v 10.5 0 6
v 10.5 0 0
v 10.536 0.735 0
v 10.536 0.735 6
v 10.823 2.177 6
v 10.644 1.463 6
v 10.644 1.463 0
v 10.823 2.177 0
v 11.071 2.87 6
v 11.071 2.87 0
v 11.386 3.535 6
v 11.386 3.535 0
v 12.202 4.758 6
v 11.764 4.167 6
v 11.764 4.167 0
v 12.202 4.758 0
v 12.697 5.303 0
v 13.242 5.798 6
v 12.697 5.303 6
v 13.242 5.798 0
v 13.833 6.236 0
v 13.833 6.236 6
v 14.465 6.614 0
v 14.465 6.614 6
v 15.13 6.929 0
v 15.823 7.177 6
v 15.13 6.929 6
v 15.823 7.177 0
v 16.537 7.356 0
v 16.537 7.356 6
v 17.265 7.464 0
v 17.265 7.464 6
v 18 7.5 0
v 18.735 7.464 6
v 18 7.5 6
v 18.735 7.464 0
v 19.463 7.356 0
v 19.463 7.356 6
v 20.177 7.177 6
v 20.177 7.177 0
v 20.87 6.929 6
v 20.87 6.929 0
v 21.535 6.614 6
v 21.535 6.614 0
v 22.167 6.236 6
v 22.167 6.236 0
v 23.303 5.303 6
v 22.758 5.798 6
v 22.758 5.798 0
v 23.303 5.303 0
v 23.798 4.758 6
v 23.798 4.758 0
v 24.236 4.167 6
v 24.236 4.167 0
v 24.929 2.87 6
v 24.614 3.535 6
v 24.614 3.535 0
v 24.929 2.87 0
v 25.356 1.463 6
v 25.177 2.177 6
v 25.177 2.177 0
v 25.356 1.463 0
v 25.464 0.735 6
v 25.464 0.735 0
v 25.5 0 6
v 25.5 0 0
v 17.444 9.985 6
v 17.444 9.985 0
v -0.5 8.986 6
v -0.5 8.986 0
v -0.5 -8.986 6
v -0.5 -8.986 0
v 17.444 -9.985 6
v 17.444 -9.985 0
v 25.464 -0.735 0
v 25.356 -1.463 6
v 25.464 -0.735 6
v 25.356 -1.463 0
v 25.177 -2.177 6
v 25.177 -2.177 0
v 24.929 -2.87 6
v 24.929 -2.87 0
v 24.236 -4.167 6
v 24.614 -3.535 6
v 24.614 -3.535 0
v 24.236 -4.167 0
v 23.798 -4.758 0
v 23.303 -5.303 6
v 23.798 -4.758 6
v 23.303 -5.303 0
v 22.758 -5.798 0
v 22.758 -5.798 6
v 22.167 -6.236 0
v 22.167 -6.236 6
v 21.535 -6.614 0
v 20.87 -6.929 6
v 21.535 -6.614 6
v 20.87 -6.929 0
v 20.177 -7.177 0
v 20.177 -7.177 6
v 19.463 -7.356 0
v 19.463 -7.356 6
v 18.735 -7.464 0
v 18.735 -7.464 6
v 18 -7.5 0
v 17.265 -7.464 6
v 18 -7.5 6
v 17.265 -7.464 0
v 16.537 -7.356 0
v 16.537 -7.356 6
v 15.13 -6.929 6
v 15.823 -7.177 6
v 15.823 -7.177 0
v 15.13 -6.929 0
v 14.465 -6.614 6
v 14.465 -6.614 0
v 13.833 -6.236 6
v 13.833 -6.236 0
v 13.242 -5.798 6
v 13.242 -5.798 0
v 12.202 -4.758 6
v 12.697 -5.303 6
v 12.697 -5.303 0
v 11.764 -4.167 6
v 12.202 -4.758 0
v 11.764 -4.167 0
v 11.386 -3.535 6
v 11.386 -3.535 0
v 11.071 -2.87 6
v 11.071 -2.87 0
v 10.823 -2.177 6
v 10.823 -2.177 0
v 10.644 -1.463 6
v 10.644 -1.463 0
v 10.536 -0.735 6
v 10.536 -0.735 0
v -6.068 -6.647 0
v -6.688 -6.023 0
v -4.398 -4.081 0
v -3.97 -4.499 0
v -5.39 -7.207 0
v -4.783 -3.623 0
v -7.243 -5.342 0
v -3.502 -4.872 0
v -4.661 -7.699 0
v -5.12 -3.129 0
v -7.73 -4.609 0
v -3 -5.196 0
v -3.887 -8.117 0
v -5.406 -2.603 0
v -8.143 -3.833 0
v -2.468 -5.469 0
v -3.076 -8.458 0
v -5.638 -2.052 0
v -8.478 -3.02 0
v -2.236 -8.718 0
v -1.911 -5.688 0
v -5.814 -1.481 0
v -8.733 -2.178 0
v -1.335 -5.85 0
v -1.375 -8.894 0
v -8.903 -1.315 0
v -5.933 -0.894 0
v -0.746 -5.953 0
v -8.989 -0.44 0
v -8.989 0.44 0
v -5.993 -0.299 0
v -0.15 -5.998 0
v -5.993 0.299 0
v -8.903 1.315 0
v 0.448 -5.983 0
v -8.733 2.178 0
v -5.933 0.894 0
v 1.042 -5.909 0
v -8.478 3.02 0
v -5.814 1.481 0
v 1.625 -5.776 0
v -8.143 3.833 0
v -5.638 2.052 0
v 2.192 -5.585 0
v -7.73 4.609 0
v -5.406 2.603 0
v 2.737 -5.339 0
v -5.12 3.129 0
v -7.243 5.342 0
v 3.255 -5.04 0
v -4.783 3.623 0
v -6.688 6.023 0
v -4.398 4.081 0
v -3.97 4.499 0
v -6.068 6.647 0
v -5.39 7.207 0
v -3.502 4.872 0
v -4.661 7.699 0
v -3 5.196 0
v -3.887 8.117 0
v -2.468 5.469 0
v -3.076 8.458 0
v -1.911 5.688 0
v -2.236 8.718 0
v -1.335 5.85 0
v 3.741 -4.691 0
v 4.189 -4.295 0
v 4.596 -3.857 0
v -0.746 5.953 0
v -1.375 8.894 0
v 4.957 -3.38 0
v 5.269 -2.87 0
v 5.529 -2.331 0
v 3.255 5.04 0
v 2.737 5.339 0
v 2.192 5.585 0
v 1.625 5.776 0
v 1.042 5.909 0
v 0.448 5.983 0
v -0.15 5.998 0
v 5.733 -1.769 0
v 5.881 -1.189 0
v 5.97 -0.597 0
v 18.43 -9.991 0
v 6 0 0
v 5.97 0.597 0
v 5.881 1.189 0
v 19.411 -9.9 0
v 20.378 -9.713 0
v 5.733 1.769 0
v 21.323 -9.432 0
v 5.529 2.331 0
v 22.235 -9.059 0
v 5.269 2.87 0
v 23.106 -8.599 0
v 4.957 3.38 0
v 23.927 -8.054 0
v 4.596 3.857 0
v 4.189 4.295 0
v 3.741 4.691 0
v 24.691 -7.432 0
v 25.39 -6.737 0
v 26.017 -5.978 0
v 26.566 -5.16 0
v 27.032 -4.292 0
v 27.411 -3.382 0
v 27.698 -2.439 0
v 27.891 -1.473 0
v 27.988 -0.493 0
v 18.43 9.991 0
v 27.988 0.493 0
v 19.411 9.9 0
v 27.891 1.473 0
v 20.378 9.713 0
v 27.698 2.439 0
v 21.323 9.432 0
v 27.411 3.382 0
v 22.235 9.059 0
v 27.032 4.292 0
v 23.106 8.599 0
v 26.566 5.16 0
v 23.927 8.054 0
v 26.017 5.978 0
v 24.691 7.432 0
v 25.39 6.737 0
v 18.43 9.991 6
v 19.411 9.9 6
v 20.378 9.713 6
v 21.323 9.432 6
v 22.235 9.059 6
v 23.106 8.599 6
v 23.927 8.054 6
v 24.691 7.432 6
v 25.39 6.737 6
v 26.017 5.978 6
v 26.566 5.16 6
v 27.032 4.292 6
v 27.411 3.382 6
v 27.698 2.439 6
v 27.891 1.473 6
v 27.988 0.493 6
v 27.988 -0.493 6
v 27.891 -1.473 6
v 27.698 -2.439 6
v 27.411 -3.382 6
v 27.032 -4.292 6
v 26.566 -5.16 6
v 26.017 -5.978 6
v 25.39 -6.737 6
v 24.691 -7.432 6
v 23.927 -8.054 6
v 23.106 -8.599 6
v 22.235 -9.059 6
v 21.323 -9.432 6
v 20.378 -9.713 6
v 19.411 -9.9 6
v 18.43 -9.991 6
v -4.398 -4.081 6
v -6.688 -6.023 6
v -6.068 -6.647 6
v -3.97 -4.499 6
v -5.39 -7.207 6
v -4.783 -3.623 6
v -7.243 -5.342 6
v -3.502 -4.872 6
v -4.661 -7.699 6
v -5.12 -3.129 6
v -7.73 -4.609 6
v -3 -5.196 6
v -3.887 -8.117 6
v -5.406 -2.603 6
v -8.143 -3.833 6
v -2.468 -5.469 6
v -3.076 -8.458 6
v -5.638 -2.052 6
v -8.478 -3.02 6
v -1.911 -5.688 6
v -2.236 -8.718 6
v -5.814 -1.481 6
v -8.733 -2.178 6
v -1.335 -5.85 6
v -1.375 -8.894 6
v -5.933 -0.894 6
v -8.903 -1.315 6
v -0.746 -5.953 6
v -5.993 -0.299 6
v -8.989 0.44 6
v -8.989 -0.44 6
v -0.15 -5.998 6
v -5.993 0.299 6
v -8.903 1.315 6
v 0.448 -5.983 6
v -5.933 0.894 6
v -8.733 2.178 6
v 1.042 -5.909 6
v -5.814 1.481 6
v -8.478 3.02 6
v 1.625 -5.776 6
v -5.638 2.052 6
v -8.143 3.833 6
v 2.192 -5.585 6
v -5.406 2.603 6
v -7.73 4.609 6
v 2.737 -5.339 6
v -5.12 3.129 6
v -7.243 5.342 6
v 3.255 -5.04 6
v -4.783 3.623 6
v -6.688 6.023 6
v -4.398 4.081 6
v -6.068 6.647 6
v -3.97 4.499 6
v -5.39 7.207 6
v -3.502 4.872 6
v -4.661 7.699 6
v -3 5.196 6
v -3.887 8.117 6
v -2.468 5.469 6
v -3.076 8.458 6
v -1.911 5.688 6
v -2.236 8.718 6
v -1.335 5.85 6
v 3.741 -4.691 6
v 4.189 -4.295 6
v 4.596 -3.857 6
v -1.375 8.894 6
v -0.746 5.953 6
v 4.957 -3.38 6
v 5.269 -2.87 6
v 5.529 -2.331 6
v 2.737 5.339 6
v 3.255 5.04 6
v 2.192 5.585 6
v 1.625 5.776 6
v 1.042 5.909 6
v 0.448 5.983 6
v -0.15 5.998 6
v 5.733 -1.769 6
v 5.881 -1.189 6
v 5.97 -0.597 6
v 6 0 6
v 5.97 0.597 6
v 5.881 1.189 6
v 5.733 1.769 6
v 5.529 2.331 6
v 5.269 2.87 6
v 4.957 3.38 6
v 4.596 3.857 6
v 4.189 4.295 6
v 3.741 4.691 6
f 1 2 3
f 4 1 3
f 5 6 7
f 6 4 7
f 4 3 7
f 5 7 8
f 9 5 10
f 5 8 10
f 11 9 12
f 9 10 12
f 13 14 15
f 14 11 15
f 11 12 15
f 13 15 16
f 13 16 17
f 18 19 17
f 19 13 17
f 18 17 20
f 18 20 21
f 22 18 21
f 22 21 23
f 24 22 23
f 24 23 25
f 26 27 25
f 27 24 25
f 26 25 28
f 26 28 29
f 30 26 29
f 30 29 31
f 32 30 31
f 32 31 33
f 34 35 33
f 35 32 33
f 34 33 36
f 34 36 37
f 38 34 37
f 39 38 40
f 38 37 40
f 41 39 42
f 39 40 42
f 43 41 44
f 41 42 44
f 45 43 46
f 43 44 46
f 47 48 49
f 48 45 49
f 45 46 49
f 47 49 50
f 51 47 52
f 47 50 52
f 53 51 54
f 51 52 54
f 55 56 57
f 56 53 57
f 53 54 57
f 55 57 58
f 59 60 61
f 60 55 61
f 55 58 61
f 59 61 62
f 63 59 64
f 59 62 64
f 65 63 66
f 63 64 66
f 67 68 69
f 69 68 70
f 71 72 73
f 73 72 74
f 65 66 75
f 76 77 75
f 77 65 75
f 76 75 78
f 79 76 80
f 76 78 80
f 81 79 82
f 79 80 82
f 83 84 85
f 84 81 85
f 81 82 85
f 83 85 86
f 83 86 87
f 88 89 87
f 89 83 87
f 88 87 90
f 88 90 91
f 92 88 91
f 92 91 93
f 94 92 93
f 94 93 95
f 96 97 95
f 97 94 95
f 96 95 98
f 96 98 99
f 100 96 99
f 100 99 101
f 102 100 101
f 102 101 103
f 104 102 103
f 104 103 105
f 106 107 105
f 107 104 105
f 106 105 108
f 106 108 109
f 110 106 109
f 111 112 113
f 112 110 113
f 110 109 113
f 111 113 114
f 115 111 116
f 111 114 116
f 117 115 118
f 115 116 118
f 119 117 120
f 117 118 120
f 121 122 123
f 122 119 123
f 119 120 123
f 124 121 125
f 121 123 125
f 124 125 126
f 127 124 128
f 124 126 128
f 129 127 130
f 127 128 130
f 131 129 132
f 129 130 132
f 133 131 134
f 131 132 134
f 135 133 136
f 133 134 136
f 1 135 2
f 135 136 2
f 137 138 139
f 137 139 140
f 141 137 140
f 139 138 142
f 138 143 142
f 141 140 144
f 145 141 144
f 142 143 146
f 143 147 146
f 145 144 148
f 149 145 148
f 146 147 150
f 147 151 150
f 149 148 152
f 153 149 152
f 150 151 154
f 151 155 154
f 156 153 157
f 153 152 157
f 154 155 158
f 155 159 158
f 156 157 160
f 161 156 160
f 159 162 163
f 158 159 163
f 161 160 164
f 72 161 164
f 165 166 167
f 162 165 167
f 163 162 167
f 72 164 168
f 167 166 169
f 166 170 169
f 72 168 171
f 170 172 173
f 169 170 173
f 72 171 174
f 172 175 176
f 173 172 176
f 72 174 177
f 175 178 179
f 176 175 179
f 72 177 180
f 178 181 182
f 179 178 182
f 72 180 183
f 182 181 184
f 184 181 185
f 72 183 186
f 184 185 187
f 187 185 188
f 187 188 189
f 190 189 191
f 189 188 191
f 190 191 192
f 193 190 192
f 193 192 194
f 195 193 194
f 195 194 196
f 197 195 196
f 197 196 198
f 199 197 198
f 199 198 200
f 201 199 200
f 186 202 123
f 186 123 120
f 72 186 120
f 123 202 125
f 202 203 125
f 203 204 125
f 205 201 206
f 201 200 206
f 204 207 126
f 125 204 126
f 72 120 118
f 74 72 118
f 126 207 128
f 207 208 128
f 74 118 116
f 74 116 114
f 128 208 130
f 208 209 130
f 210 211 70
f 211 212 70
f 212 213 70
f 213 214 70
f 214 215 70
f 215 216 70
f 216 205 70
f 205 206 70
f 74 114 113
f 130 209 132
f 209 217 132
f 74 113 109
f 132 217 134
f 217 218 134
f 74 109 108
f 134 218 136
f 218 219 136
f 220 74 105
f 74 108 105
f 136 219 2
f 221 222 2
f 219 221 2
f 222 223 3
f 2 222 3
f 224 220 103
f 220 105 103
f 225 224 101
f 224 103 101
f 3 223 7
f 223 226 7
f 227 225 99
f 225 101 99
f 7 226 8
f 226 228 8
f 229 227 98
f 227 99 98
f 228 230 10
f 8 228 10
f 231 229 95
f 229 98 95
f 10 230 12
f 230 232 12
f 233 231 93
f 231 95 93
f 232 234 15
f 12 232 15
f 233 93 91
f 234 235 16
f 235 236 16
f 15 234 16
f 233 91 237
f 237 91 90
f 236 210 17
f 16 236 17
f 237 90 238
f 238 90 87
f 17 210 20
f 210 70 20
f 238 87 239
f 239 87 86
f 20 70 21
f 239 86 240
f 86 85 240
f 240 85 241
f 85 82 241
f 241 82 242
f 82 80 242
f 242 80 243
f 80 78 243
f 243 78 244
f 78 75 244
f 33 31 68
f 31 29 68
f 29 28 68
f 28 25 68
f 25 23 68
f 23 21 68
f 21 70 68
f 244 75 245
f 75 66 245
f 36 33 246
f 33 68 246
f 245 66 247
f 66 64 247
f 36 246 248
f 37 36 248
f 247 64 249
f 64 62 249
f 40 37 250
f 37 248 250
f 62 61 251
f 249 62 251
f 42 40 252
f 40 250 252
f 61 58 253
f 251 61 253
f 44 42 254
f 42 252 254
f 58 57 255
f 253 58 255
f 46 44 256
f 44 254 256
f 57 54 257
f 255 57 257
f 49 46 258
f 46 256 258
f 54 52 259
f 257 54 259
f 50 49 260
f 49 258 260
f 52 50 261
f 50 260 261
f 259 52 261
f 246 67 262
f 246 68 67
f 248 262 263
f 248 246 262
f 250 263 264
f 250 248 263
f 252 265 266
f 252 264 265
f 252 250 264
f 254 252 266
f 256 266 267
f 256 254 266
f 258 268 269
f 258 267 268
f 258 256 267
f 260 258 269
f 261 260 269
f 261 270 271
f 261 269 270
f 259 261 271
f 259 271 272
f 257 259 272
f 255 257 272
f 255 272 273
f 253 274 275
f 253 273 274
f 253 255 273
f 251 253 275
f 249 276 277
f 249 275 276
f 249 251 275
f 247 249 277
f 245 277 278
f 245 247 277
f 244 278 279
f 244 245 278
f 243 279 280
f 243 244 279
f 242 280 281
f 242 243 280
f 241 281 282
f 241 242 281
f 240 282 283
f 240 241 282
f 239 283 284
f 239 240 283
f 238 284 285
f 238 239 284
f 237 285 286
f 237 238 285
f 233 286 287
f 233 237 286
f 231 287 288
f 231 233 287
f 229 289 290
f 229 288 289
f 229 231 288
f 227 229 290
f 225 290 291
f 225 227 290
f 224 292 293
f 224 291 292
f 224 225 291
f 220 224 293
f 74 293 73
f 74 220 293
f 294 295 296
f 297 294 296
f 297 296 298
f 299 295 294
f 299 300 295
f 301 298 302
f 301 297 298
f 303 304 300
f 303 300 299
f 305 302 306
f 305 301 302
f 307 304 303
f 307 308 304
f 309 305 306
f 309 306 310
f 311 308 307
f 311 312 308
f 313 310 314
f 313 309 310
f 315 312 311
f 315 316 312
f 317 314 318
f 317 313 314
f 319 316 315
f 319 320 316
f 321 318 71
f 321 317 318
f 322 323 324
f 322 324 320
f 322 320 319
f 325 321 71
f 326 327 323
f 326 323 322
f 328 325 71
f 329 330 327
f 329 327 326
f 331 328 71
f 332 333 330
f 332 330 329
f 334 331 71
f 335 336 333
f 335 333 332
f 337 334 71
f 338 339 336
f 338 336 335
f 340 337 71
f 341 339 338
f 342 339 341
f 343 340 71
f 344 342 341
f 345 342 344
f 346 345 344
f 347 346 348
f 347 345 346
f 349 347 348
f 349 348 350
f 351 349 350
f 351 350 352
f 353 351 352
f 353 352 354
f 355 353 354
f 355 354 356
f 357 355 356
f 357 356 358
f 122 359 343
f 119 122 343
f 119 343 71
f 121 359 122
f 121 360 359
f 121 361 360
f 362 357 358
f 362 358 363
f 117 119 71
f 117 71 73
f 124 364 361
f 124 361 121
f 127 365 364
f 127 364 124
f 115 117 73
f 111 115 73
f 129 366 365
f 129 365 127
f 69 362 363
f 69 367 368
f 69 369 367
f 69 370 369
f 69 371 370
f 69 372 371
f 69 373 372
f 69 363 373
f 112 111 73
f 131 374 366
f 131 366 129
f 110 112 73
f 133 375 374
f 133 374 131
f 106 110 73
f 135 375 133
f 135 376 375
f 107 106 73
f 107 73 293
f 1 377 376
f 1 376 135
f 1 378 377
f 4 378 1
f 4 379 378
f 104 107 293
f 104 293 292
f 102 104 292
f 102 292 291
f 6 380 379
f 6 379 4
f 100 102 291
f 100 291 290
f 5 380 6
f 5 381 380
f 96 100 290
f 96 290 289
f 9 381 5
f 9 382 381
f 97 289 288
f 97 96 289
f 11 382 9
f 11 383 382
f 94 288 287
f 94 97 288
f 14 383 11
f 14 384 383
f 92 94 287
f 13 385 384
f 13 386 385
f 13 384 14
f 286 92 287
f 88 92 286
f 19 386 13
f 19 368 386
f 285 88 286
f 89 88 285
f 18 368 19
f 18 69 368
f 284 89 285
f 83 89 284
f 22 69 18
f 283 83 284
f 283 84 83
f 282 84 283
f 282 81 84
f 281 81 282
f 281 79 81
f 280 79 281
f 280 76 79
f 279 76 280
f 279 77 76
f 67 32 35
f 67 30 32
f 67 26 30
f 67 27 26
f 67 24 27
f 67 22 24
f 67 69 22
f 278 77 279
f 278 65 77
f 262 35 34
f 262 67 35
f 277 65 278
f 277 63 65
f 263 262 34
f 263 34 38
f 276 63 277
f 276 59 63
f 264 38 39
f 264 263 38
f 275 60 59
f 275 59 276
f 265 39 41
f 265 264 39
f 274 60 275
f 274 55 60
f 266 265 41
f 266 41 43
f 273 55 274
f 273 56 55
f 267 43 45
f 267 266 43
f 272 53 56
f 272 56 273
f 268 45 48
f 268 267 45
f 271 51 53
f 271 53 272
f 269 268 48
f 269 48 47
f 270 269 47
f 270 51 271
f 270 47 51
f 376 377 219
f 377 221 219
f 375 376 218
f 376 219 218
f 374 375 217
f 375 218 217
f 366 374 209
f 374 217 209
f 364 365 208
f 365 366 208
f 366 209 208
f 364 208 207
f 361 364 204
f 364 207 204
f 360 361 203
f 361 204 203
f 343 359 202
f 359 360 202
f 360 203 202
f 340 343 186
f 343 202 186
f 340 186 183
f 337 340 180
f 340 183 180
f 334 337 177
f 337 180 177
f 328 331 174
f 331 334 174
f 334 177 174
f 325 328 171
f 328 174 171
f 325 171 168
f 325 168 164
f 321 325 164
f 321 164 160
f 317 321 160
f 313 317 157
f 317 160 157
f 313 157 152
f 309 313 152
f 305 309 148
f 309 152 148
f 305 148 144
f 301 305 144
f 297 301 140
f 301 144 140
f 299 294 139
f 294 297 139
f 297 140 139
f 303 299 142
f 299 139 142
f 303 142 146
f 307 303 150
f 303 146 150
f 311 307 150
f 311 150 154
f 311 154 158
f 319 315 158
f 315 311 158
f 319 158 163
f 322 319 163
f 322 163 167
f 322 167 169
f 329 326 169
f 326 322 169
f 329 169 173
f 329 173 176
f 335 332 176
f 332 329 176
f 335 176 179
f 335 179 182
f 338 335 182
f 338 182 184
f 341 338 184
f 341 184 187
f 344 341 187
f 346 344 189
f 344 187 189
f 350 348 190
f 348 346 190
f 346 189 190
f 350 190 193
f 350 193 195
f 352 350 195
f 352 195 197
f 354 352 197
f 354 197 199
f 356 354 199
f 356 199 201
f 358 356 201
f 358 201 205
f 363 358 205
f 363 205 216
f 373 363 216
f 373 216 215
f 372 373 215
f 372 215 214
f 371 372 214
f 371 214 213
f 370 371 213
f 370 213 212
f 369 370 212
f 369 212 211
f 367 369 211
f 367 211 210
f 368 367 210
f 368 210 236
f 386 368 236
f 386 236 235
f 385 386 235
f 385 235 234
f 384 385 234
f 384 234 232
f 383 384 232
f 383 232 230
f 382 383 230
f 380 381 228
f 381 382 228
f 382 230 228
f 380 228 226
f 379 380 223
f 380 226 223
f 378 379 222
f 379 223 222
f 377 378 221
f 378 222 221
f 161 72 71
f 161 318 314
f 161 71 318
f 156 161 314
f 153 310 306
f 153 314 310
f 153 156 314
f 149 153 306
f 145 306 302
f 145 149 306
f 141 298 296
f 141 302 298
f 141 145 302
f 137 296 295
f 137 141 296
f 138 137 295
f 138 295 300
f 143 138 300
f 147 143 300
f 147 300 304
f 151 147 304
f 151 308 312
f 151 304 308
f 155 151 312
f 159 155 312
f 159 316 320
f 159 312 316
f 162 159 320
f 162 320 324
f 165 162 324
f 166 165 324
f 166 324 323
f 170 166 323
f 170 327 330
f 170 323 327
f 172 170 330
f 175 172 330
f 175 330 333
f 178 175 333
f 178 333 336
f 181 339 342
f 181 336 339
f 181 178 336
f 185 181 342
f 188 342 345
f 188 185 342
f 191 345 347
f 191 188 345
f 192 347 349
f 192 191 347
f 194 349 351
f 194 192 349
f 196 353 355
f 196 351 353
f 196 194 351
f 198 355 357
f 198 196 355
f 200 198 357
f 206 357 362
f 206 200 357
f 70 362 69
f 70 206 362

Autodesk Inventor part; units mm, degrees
ref_plane "YZ Plane" through (0, 0, 0) normal (1, 0, 0) x (0, 1, 0)
ref_plane "XZ Plane" through (0, 0, 0) normal (0, 1, 0) x (-1, 0, 0)
ref_plane "XY Plane" through (0, 0, 0) normal (0, 0, 1) x (1, 0, 0)
sketch "Эскиз1" plane through (0, 0, 0) normal (0, 0, 1) x (1, 0, 0)
  circle A0 centre (0, 0) radius 6
  circle A1 centre (18, 0) radius 7.5
  line L0 (0, 0) -> (18, 0)
  line L1 (0, 0) -> (18, 0) construction
  line L2 (-0.5, -8.9861) -> (17.4444, -9.9846)
  line L3 (17.4444, 9.9846) -> (-0.5, 8.9861)
  arc A2 (-0.5, 8.9861) -> (-0.5, -8.9861) centre (0, 0) ccw
  arc A3 (17.4444, -9.9846) -> (17.4444, 9.9846) centre (18, 0) ccw
  point P0 (9, 0)
  dimension "d0" = 12
  dimension "d1" = 15
  dimension "d2" = 18
  dimension "d4" = 9
  dimension "d7" = 10
extrude "Выдавливание1" add sketch "Эскиз1" along normal blind 6
properties part number "Крепление линейного подшипника"
